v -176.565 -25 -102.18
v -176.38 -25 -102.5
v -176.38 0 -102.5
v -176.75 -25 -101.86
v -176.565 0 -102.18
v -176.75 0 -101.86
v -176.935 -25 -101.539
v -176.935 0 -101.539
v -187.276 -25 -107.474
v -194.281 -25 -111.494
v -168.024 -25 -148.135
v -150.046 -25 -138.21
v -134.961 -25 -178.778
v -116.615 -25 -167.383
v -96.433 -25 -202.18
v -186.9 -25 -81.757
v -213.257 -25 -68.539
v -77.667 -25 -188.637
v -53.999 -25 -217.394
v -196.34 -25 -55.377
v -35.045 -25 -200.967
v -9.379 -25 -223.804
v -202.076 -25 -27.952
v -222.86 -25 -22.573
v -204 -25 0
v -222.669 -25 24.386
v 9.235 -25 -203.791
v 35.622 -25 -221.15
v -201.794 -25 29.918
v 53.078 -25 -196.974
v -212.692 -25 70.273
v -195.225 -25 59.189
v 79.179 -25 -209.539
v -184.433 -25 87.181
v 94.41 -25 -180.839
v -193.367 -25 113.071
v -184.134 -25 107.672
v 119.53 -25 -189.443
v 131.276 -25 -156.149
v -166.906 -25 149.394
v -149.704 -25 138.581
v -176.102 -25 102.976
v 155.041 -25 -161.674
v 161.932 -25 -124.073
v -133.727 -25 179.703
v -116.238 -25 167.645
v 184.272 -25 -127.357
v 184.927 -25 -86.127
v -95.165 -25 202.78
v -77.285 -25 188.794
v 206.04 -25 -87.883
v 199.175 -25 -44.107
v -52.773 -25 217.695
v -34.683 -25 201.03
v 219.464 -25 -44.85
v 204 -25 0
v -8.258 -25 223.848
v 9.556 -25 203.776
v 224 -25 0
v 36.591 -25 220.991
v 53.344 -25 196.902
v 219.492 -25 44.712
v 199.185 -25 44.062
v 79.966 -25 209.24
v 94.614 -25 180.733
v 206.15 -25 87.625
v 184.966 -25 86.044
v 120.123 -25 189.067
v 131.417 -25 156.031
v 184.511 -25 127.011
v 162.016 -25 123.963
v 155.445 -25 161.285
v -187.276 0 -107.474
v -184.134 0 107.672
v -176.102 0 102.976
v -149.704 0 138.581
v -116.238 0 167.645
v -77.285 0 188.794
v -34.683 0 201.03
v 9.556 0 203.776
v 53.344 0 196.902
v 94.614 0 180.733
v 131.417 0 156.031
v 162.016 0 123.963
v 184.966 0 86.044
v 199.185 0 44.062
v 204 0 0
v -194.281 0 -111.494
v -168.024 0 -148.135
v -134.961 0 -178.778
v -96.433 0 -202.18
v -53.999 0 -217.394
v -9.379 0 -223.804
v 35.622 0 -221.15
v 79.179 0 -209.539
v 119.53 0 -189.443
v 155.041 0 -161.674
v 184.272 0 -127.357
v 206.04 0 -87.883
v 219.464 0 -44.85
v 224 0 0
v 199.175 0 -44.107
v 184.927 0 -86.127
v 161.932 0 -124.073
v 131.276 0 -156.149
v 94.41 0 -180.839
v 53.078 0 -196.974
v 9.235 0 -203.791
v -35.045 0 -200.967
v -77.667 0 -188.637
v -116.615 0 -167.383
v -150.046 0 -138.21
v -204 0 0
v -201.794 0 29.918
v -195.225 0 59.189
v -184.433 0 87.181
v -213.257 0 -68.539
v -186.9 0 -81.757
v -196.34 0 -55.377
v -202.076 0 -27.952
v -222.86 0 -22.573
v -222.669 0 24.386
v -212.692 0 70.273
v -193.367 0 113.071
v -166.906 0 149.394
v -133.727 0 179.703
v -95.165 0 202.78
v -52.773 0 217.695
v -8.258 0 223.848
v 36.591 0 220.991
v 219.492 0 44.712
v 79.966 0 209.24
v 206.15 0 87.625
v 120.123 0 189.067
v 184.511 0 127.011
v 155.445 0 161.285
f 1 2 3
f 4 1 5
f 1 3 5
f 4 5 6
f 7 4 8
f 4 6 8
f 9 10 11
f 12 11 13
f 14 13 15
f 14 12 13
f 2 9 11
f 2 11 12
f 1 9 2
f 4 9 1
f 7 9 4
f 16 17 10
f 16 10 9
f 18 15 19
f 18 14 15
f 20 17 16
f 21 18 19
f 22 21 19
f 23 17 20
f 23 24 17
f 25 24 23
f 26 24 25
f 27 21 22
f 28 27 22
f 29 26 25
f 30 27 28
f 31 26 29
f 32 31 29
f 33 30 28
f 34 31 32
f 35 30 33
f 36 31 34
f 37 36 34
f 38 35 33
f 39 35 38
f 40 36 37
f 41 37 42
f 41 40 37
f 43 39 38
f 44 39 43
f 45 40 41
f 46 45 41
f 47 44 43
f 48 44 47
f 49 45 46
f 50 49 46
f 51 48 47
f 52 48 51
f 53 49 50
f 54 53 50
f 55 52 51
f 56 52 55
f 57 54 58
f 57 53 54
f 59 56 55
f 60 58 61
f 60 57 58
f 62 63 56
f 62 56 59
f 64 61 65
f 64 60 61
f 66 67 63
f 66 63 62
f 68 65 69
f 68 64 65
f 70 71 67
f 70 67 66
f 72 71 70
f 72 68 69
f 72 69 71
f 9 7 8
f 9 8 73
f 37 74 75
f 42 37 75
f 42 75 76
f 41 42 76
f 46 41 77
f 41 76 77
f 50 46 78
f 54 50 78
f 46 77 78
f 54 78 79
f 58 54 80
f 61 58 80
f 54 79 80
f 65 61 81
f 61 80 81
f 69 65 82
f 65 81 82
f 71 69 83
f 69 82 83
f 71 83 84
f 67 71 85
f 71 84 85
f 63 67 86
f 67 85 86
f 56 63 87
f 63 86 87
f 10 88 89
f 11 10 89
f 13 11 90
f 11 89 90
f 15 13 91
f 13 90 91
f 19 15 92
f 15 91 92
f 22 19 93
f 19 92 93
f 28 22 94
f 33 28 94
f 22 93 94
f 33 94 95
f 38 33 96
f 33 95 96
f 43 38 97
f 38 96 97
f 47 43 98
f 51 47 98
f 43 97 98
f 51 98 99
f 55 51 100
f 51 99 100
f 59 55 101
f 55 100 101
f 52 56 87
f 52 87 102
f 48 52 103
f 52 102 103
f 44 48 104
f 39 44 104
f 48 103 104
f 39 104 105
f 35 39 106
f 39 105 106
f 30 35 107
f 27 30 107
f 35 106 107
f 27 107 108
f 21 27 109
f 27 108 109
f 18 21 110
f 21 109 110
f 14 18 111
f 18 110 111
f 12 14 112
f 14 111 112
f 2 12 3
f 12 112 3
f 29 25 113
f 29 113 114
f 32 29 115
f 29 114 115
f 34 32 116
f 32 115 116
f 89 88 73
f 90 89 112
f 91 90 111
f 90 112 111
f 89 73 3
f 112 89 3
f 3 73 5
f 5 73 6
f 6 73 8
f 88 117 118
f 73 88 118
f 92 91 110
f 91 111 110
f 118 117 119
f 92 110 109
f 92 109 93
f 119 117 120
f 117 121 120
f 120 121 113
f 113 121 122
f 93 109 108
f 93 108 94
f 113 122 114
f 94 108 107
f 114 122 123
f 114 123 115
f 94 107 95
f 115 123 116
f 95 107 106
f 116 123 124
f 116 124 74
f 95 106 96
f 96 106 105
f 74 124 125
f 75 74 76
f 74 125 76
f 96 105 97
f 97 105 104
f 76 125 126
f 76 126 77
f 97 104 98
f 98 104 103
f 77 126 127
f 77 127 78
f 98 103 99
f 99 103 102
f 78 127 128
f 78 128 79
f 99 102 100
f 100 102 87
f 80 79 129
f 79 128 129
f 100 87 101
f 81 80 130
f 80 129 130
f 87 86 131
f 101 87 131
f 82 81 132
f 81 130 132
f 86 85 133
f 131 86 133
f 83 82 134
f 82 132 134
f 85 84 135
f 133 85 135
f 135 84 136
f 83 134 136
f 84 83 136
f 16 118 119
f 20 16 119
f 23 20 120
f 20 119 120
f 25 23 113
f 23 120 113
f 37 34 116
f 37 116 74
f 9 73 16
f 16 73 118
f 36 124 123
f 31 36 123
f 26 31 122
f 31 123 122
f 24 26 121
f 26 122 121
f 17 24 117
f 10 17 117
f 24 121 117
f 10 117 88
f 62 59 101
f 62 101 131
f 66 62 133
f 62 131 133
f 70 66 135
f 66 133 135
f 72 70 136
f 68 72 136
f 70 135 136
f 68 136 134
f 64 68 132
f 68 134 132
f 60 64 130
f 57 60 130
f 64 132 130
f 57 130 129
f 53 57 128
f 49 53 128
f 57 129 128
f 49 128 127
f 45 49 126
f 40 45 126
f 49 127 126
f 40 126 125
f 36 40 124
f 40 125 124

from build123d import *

# Parameters (mm, degrees)
F1_DEPTH = 25


with BuildPart() as f1:
    # F0 (on Front) → F1 (new body)
    with BuildSketch(Plane.XZ):
        with BuildLine():
            ThreePointArc((-194.281157, -111.493641), (57.693244, -216.442809), (224, 0))
            ThreePointArc((224, 0), (58.573691, 216.206204), (-193.367167, 113.071388))
            Line((-193.367167, 113.071388), (-184.133718, 107.672132))
            Line((-184.133718, 107.672132), (-176.102241, 102.975729))
            ThreePointArc((-176.102241, 102.975729), (53.343898, 196.902079), (204, 0))
            ThreePointArc((204, 0), (53.078099, -196.973895), (-176.379562, -102.5))
            ThreePointArc((-176.379562, -102.5), (-176.657747, -102.019803), (-176.934625, -101.538852))
            Line((-176.934625, -101.538852), (-187.276068, -107.473576))
            Line((-187.276068, -107.473576), (-194.281157, -111.493641))
        make_face()
        with BuildLine():
            Line((-184.133718, 107.672132), (-193.367167, 113.071388))
            ThreePointArc((-193.367167, 113.071388), (-223.998145, 0.911683), (-194.281157, -111.493641))
            Line((-194.281157, -111.493641), (-187.276068, -107.473576))
            Line((-187.276068, -107.473576), (-186.90046, -81.757066))
            ThreePointArc((-186.90046, -81.757066), (-199.67936, -41.763058), (-204, 0))
            ThreePointArc((-204, 0), (-199.048152, 44.674747), (-184.43301, 87.180645))
            Line((-184.43301, 87.180645), (-184.133718, 107.672132))
        make_face()
    extrude(amount=F1_DEPTH)


solid = f1.part
